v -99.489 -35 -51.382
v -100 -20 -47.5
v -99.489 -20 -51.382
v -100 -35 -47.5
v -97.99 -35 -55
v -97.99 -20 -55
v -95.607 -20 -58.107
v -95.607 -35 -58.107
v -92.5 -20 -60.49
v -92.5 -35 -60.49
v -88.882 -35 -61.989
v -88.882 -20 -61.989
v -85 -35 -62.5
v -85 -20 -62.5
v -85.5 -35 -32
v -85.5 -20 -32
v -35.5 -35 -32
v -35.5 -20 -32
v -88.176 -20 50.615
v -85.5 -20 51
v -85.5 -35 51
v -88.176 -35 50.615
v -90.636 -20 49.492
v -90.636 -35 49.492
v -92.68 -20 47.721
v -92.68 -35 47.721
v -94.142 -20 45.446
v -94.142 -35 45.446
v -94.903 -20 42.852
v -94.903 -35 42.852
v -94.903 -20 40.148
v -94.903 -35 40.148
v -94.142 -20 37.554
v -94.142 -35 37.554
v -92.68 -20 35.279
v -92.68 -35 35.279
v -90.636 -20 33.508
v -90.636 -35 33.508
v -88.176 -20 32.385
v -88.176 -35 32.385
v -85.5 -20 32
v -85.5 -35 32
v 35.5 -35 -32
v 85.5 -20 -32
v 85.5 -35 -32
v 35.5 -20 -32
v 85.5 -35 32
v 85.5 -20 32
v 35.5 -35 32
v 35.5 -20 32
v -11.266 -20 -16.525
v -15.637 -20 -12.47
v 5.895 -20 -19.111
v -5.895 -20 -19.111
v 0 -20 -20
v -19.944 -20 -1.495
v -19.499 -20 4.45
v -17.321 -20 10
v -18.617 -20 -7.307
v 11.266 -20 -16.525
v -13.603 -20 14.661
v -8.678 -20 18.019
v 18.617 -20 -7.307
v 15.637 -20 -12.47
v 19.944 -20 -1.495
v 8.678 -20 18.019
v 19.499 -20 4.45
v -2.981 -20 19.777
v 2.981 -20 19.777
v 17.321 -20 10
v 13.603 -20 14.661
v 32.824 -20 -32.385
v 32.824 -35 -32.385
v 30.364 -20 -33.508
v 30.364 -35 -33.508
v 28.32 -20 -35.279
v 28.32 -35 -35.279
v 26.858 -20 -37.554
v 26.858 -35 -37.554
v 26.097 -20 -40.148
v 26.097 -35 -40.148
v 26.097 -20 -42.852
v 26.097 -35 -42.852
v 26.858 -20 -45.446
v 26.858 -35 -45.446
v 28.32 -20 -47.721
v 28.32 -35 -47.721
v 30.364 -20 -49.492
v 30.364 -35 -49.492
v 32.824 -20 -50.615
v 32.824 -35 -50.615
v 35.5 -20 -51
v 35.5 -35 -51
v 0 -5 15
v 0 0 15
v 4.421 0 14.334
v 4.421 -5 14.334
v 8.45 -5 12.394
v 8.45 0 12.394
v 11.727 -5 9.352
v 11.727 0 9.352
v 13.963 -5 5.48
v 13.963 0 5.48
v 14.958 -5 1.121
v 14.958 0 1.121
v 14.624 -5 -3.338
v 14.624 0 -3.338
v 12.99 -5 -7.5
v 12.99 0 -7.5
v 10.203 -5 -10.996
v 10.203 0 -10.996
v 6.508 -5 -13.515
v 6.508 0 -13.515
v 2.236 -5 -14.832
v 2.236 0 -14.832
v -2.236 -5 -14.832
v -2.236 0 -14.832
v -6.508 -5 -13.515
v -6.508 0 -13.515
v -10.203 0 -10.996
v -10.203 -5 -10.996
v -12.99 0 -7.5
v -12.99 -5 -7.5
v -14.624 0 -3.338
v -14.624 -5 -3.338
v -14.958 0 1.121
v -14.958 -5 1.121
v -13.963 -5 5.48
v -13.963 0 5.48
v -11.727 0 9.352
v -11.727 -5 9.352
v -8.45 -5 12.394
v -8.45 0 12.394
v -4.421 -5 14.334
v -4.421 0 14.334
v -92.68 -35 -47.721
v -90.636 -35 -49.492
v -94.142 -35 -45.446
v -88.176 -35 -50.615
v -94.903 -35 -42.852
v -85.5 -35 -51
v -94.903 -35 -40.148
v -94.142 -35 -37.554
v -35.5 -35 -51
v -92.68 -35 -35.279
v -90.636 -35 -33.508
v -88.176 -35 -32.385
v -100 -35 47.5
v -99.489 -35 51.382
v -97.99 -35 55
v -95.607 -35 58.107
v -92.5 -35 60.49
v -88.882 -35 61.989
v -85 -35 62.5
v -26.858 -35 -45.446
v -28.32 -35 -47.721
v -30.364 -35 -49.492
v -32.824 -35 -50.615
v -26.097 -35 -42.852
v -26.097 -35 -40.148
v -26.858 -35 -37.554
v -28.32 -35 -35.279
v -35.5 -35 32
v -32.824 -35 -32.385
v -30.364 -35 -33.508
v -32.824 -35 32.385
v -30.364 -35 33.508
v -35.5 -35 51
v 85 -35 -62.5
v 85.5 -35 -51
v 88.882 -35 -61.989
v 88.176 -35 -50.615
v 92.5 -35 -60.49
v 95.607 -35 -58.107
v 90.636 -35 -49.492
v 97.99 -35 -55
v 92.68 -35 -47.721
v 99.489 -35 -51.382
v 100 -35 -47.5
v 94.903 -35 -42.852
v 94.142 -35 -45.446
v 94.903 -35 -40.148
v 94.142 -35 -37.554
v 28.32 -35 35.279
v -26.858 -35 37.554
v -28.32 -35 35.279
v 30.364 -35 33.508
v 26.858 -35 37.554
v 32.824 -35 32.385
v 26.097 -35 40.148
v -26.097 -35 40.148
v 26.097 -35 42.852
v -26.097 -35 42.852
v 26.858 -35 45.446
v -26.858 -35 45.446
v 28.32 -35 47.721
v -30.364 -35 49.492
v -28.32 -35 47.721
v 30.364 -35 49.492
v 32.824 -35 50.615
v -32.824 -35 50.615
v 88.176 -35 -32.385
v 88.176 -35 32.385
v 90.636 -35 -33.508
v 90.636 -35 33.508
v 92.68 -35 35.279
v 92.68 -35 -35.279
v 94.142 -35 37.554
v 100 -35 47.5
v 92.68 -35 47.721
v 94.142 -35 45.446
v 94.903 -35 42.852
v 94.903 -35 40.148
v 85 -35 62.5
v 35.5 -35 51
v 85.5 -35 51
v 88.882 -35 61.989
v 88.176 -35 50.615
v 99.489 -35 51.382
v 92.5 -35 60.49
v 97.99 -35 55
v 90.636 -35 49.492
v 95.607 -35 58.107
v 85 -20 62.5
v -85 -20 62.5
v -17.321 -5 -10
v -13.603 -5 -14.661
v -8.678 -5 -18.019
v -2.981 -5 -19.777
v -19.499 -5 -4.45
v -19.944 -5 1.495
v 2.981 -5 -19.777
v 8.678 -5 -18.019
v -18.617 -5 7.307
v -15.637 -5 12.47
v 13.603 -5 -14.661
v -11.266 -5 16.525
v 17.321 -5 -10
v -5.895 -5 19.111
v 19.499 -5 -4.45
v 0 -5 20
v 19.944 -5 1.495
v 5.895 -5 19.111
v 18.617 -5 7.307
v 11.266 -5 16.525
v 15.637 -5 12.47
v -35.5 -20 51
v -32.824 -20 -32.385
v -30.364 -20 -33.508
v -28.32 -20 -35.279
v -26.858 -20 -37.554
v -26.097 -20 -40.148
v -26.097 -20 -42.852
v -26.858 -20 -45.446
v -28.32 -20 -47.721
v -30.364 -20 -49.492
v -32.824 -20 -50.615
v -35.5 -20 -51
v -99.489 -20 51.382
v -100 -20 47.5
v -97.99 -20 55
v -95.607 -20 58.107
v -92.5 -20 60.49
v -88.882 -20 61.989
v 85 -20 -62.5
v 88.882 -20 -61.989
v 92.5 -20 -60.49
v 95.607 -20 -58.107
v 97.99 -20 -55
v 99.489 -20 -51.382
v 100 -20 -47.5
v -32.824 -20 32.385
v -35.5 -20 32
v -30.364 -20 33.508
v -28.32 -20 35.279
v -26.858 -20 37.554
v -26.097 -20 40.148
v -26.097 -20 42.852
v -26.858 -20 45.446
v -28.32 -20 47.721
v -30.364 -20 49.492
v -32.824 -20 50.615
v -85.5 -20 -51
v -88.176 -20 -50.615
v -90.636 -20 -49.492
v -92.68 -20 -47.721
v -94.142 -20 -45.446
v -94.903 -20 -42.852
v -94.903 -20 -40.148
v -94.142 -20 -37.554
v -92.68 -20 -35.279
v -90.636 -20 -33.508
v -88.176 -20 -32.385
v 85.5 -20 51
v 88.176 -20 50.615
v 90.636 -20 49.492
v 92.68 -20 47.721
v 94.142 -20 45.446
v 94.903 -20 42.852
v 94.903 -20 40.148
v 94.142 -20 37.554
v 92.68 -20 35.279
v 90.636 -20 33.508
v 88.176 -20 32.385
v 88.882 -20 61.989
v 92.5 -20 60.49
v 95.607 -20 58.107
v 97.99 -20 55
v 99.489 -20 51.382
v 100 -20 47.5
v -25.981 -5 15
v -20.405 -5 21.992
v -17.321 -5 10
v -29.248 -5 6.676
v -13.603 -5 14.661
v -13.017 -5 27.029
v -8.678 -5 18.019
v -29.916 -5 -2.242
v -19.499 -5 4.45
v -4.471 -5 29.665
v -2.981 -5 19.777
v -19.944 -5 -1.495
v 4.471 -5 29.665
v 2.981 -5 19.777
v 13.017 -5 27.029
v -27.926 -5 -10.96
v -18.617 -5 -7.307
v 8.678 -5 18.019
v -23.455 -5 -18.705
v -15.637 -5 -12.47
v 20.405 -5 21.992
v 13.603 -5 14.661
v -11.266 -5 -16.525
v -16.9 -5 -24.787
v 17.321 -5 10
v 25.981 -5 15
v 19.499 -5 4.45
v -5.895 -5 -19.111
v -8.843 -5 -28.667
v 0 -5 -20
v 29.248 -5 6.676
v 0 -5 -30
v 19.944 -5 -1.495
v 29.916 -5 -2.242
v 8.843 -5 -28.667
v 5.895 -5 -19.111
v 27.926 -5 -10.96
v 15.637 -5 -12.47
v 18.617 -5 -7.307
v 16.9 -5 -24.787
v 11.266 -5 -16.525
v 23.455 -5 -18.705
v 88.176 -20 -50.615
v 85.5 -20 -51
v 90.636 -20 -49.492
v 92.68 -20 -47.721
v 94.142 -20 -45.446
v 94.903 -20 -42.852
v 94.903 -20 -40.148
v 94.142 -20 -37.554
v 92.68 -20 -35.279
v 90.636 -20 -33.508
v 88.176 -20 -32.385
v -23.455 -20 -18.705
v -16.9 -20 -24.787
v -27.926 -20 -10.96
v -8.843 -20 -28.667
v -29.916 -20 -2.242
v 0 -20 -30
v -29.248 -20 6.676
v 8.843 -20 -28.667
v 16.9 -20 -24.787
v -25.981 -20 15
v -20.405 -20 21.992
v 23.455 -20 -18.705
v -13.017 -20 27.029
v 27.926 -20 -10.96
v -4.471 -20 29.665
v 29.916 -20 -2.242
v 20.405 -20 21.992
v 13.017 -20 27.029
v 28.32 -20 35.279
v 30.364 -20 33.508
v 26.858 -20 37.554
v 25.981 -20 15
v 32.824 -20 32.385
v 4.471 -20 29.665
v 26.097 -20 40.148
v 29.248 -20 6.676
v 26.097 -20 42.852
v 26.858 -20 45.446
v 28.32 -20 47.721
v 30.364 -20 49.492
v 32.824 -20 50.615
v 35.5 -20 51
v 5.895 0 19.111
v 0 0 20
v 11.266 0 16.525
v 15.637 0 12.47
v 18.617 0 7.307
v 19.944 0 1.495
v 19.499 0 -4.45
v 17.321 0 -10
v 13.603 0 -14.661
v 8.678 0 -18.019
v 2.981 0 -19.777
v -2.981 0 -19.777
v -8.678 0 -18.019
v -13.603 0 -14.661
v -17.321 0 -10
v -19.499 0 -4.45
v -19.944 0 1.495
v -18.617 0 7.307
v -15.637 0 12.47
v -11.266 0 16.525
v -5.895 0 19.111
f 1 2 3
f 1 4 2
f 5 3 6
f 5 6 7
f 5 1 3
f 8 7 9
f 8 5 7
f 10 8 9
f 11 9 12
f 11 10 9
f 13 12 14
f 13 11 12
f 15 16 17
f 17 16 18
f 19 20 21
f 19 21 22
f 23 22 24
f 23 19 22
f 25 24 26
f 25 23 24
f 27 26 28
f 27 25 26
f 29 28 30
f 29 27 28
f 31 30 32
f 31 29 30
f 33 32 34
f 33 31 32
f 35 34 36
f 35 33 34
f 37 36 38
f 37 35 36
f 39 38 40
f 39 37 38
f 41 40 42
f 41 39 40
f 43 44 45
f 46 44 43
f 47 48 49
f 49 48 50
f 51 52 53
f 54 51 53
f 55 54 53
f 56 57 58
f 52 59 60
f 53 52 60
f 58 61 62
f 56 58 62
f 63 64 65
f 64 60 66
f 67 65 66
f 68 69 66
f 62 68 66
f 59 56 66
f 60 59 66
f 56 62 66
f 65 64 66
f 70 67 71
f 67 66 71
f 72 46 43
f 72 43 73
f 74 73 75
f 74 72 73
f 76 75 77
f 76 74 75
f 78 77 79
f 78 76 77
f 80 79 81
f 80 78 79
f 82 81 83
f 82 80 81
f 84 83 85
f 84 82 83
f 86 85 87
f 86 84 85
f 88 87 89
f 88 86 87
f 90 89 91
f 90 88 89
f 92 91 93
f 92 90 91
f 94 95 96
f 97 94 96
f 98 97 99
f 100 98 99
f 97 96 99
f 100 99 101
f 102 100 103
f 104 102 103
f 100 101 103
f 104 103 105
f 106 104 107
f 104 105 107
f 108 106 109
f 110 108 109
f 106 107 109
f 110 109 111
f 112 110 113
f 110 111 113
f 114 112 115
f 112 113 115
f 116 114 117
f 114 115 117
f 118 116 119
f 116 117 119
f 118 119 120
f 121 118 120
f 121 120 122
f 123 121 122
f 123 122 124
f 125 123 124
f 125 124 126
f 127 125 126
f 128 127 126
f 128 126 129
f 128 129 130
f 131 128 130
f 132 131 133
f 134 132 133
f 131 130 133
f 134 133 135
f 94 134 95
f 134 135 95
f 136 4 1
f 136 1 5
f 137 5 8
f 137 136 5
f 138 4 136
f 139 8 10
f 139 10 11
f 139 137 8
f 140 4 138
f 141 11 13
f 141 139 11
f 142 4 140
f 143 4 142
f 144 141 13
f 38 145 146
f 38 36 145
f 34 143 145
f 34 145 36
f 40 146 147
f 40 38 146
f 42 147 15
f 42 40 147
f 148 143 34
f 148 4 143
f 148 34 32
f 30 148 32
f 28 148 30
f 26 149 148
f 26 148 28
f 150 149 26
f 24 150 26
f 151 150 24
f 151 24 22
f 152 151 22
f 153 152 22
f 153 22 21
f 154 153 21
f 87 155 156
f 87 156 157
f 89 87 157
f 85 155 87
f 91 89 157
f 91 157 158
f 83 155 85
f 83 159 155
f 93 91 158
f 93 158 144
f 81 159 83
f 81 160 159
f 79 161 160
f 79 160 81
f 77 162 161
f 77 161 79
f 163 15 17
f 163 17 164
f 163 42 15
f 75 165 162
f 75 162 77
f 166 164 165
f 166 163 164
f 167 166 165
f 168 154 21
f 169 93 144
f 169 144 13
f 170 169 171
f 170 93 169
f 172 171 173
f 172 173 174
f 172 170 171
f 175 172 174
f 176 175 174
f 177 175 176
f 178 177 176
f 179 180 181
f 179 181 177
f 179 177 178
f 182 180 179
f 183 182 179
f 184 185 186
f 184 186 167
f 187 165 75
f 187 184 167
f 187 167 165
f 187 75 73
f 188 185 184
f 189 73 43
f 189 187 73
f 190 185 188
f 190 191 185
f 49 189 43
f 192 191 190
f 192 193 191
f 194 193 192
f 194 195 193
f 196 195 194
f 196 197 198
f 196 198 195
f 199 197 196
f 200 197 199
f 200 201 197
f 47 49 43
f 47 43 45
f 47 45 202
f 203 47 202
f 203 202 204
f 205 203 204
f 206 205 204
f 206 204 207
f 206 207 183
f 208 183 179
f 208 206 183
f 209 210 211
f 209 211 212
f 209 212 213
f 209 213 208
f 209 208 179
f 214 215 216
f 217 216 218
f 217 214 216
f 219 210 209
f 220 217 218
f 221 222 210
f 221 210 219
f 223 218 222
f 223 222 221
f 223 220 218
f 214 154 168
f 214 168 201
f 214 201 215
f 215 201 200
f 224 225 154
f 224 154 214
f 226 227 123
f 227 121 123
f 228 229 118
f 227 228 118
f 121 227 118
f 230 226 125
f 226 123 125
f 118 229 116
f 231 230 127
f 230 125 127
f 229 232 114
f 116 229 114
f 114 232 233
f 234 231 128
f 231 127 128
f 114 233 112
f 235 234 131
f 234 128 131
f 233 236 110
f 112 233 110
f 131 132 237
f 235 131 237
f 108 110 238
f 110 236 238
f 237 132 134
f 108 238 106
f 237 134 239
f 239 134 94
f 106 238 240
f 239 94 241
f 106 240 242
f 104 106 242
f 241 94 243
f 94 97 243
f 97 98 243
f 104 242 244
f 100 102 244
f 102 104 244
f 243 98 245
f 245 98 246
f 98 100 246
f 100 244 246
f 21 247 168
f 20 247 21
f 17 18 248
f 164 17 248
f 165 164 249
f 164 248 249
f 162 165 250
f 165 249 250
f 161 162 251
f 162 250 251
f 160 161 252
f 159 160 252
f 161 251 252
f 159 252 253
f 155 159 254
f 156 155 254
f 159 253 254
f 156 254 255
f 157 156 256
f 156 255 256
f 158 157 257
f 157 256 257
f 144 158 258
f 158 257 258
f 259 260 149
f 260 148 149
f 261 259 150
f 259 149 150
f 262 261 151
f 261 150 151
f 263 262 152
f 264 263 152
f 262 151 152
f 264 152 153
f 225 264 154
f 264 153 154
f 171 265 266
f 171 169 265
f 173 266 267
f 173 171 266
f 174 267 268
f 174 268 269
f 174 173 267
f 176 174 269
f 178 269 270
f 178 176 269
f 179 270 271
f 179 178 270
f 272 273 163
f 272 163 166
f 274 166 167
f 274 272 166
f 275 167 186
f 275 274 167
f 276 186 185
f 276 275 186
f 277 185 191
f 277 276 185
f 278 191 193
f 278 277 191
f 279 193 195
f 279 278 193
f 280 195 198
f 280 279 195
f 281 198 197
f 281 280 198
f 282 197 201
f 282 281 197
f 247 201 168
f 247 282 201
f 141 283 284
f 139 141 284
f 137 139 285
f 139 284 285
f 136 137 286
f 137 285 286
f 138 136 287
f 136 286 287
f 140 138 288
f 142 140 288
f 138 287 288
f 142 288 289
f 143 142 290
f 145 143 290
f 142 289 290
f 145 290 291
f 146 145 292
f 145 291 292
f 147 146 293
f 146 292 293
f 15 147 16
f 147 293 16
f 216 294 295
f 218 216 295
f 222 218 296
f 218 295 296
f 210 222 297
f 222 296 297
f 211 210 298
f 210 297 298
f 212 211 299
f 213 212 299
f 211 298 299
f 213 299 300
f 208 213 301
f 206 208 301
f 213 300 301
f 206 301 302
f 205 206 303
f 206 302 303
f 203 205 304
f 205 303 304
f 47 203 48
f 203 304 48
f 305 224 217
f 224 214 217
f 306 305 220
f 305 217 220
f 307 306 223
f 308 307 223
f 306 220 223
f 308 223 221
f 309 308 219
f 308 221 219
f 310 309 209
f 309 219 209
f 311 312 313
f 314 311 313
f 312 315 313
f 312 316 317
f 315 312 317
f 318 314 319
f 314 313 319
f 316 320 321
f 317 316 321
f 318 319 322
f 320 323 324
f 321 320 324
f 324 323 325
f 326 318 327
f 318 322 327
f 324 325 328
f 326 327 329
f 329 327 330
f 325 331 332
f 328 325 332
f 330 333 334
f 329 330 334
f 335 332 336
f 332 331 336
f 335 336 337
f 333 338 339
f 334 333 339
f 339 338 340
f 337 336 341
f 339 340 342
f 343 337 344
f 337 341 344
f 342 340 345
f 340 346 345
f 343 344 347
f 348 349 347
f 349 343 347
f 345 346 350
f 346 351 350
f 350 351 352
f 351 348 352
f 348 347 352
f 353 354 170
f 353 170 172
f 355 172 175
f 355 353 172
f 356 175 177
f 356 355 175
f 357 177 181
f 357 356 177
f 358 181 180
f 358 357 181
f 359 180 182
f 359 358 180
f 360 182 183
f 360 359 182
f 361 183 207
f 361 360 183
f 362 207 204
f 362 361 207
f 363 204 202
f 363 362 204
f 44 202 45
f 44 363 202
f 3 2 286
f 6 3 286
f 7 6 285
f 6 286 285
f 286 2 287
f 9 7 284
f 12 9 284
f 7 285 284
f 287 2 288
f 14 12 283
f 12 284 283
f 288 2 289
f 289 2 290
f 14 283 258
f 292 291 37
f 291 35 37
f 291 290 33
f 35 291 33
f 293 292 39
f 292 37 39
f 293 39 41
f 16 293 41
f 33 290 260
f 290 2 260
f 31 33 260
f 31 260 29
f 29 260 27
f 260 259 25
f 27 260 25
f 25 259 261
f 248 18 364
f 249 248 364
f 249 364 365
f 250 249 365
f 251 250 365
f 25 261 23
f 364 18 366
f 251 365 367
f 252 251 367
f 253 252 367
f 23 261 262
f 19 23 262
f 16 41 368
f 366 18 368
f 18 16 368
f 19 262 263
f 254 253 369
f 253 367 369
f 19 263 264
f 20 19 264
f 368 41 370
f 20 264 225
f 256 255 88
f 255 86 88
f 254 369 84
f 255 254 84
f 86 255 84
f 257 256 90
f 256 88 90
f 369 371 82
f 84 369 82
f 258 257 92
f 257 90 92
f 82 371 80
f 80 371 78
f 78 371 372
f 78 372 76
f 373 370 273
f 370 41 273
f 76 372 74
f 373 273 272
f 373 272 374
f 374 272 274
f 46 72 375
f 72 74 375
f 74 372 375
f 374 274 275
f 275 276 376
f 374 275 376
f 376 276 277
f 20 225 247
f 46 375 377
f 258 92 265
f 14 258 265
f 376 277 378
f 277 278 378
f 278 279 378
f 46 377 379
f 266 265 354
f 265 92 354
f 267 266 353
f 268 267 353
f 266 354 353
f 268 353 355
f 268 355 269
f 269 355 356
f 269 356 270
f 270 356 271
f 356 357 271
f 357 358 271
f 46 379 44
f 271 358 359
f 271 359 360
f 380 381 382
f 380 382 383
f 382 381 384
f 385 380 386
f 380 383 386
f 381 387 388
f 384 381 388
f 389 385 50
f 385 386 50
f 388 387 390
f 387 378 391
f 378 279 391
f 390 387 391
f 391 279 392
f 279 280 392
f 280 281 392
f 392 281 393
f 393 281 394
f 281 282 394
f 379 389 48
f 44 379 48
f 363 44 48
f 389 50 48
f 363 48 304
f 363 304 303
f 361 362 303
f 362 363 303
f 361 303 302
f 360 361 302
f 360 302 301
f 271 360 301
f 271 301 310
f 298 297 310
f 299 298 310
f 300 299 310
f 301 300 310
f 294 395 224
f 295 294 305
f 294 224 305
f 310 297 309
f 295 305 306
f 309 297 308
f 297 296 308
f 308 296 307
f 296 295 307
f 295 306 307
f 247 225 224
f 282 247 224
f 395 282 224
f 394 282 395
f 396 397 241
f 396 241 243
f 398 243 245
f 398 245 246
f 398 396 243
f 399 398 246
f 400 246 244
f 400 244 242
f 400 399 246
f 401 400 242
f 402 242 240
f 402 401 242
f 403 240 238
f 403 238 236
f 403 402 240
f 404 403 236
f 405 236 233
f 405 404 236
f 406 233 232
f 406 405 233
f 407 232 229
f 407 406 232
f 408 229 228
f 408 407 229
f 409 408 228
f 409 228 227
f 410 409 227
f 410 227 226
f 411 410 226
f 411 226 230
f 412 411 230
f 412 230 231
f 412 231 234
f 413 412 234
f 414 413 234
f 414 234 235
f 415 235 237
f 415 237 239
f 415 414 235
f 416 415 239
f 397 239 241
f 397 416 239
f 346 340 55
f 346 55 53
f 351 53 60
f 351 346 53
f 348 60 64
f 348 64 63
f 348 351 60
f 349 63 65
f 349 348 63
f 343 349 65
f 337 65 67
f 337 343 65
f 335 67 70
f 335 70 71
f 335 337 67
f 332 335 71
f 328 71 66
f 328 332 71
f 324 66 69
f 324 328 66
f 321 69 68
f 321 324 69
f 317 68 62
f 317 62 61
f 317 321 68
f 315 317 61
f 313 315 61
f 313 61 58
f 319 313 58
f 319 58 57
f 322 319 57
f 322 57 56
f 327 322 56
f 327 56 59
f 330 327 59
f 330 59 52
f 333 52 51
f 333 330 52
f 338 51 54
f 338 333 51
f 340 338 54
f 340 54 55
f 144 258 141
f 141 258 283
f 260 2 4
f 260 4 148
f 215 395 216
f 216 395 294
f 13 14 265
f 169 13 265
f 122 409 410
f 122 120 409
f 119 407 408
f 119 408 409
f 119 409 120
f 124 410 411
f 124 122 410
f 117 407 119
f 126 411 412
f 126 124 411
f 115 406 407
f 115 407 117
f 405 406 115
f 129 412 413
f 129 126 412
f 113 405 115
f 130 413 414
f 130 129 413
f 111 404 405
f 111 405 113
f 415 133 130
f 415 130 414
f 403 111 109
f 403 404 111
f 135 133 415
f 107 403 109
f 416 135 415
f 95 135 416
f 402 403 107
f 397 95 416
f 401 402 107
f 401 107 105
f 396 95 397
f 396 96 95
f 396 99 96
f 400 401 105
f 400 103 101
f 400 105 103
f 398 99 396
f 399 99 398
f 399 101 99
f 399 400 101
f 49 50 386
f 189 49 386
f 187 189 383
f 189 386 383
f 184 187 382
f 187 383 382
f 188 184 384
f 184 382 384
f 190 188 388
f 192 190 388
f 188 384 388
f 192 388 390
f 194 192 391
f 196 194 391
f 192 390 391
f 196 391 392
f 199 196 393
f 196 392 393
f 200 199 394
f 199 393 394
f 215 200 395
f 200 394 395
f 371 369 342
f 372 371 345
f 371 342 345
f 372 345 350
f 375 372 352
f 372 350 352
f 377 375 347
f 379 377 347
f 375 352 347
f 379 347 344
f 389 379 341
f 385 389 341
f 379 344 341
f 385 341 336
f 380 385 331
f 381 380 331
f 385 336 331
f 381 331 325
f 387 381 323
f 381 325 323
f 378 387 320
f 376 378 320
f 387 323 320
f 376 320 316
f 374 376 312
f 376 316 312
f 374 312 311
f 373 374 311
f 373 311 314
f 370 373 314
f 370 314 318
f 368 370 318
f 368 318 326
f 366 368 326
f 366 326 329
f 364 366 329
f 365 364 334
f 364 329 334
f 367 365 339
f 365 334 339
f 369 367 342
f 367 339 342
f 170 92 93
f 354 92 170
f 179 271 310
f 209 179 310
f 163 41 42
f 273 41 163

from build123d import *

# Parameters (mm, degrees)
SKETCH2_R            = 20
SKETCH2_R_2          = 15
BOSS_EXTRUDE1_DEPTH  = 5
SKETCH3_R            = 30
SKETCH3_R_2          = 20
BOSS_EXTRUDE2_DEPTH  = 15
SKETCH4_W            = 200
SKETCH4_H            = 125
BOSS_EXTRUDE3_DEPTH  = 15
FILLET1_R            = 15
CUT_EXTRUDE1_DEPTH   = 120.608737139
MIRROR2_COPY_1_DEPTH = 120.608737139


with BuildPart() as part:
    # Sketch2 → Boss-Extrude1 (new body)
    with BuildSketch(Plane(origin=(0, 0, 0), x_dir=(1, 0, 0), z_dir=(0, 1, 0))):
        with Locations(Location((0, 0, 0), (0, 0, 270))):
            Circle(SKETCH2_R)
        with Locations(Location((0, 0, 0), (0, 0, 270))):
            Circle(SKETCH2_R_2, mode=Mode.SUBTRACT)
    extrude(amount=-BOSS_EXTRUDE1_DEPTH)


with BuildPart() as body_2:
    # Sketch3 → Boss-Extrude2 (new body)
    with BuildSketch(Plane.XZ.offset(5)):
        with Locations(Location((0, 0, 0), (0, 0, 270))):
            Circle(SKETCH3_R)
        with Locations(Location((0, 0, 0), (0, 0, 270))):
            Circle(SKETCH3_R_2, mode=Mode.SUBTRACT)
    extrude(amount=BOSS_EXTRUDE2_DEPTH)

    # Sketch4 → Boss-Extrude3 (add)
    with BuildSketch(Plane.XZ.offset(20)):
        Rectangle(SKETCH4_W, SKETCH4_H)
    extrude(amount=BOSS_EXTRUDE3_DEPTH)

    # Fillet1
    fillet1_edges = [body_2.edges().sort_by_distance(p)[0] for p in [
        (100, -27.5, -62.5),
        (100, -27.5, 62.5),
        (-100, -27.5, 62.5),
        (-100, -27.5, -62.5),
    ]]
    fillet(fillet1_edges, radius=FILLET1_R)

    # Sketch5 → Cut-Extrude1 (cut, through all)
    with BuildSketch(Plane(origin=(0, -20, 0), x_dir=(1, 0, 0), z_dir=(0, 1, 0))):
        with BuildLine():
            Line((-85.5, -32), (-35.5, -32))
            ThreePointArc((-35.5, -32), (-26, -41.5), (-35.5, -51))
            Line((-35.5, -51), (-85.5, -51))
            ThreePointArc((-85.5, -51), (-95, -41.5), (-85.5, -32))
        make_face()
    cut_extrude1 = extrude(amount=-CUT_EXTRUDE1_DEPTH, mode=Mode.SUBTRACT)

    # Mirror1: Cut-Extrude1 across plane
    add(cut_extrude1.mirror(Plane.XY), mode=Mode.SUBTRACT)

    # Mirror2: Cut-Extrude1 across plane
    add(cut_extrude1.mirror(Plane(origin=(0, 0, 0), x_dir=(0, 0, 1), z_dir=(1, 0, 0))), mode=Mode.SUBTRACT)

    # Mirror2 copy 1 sketch → Mirror2 copy 1 (cut, through all)
    with BuildSketch(Plane(origin=(0, -20, 0), x_dir=(-1, 0, 0), z_dir=(0, 1, 0))):
        with BuildLine():
            Line((-85.5, -32), (-35.5, -32))
            ThreePointArc((-35.5, -32), (-26, -41.5), (-35.5, -51))
            Line((-35.5, -51), (-85.5, -51))
            ThreePointArc((-85.5, -51), (-95, -41.5), (-85.5, -32))
        make_face()
    extrude(amount=-MIRROR2_COPY_1_DEPTH, mode=Mode.SUBTRACT)


solid = Compound([part.part, body_2.part])
